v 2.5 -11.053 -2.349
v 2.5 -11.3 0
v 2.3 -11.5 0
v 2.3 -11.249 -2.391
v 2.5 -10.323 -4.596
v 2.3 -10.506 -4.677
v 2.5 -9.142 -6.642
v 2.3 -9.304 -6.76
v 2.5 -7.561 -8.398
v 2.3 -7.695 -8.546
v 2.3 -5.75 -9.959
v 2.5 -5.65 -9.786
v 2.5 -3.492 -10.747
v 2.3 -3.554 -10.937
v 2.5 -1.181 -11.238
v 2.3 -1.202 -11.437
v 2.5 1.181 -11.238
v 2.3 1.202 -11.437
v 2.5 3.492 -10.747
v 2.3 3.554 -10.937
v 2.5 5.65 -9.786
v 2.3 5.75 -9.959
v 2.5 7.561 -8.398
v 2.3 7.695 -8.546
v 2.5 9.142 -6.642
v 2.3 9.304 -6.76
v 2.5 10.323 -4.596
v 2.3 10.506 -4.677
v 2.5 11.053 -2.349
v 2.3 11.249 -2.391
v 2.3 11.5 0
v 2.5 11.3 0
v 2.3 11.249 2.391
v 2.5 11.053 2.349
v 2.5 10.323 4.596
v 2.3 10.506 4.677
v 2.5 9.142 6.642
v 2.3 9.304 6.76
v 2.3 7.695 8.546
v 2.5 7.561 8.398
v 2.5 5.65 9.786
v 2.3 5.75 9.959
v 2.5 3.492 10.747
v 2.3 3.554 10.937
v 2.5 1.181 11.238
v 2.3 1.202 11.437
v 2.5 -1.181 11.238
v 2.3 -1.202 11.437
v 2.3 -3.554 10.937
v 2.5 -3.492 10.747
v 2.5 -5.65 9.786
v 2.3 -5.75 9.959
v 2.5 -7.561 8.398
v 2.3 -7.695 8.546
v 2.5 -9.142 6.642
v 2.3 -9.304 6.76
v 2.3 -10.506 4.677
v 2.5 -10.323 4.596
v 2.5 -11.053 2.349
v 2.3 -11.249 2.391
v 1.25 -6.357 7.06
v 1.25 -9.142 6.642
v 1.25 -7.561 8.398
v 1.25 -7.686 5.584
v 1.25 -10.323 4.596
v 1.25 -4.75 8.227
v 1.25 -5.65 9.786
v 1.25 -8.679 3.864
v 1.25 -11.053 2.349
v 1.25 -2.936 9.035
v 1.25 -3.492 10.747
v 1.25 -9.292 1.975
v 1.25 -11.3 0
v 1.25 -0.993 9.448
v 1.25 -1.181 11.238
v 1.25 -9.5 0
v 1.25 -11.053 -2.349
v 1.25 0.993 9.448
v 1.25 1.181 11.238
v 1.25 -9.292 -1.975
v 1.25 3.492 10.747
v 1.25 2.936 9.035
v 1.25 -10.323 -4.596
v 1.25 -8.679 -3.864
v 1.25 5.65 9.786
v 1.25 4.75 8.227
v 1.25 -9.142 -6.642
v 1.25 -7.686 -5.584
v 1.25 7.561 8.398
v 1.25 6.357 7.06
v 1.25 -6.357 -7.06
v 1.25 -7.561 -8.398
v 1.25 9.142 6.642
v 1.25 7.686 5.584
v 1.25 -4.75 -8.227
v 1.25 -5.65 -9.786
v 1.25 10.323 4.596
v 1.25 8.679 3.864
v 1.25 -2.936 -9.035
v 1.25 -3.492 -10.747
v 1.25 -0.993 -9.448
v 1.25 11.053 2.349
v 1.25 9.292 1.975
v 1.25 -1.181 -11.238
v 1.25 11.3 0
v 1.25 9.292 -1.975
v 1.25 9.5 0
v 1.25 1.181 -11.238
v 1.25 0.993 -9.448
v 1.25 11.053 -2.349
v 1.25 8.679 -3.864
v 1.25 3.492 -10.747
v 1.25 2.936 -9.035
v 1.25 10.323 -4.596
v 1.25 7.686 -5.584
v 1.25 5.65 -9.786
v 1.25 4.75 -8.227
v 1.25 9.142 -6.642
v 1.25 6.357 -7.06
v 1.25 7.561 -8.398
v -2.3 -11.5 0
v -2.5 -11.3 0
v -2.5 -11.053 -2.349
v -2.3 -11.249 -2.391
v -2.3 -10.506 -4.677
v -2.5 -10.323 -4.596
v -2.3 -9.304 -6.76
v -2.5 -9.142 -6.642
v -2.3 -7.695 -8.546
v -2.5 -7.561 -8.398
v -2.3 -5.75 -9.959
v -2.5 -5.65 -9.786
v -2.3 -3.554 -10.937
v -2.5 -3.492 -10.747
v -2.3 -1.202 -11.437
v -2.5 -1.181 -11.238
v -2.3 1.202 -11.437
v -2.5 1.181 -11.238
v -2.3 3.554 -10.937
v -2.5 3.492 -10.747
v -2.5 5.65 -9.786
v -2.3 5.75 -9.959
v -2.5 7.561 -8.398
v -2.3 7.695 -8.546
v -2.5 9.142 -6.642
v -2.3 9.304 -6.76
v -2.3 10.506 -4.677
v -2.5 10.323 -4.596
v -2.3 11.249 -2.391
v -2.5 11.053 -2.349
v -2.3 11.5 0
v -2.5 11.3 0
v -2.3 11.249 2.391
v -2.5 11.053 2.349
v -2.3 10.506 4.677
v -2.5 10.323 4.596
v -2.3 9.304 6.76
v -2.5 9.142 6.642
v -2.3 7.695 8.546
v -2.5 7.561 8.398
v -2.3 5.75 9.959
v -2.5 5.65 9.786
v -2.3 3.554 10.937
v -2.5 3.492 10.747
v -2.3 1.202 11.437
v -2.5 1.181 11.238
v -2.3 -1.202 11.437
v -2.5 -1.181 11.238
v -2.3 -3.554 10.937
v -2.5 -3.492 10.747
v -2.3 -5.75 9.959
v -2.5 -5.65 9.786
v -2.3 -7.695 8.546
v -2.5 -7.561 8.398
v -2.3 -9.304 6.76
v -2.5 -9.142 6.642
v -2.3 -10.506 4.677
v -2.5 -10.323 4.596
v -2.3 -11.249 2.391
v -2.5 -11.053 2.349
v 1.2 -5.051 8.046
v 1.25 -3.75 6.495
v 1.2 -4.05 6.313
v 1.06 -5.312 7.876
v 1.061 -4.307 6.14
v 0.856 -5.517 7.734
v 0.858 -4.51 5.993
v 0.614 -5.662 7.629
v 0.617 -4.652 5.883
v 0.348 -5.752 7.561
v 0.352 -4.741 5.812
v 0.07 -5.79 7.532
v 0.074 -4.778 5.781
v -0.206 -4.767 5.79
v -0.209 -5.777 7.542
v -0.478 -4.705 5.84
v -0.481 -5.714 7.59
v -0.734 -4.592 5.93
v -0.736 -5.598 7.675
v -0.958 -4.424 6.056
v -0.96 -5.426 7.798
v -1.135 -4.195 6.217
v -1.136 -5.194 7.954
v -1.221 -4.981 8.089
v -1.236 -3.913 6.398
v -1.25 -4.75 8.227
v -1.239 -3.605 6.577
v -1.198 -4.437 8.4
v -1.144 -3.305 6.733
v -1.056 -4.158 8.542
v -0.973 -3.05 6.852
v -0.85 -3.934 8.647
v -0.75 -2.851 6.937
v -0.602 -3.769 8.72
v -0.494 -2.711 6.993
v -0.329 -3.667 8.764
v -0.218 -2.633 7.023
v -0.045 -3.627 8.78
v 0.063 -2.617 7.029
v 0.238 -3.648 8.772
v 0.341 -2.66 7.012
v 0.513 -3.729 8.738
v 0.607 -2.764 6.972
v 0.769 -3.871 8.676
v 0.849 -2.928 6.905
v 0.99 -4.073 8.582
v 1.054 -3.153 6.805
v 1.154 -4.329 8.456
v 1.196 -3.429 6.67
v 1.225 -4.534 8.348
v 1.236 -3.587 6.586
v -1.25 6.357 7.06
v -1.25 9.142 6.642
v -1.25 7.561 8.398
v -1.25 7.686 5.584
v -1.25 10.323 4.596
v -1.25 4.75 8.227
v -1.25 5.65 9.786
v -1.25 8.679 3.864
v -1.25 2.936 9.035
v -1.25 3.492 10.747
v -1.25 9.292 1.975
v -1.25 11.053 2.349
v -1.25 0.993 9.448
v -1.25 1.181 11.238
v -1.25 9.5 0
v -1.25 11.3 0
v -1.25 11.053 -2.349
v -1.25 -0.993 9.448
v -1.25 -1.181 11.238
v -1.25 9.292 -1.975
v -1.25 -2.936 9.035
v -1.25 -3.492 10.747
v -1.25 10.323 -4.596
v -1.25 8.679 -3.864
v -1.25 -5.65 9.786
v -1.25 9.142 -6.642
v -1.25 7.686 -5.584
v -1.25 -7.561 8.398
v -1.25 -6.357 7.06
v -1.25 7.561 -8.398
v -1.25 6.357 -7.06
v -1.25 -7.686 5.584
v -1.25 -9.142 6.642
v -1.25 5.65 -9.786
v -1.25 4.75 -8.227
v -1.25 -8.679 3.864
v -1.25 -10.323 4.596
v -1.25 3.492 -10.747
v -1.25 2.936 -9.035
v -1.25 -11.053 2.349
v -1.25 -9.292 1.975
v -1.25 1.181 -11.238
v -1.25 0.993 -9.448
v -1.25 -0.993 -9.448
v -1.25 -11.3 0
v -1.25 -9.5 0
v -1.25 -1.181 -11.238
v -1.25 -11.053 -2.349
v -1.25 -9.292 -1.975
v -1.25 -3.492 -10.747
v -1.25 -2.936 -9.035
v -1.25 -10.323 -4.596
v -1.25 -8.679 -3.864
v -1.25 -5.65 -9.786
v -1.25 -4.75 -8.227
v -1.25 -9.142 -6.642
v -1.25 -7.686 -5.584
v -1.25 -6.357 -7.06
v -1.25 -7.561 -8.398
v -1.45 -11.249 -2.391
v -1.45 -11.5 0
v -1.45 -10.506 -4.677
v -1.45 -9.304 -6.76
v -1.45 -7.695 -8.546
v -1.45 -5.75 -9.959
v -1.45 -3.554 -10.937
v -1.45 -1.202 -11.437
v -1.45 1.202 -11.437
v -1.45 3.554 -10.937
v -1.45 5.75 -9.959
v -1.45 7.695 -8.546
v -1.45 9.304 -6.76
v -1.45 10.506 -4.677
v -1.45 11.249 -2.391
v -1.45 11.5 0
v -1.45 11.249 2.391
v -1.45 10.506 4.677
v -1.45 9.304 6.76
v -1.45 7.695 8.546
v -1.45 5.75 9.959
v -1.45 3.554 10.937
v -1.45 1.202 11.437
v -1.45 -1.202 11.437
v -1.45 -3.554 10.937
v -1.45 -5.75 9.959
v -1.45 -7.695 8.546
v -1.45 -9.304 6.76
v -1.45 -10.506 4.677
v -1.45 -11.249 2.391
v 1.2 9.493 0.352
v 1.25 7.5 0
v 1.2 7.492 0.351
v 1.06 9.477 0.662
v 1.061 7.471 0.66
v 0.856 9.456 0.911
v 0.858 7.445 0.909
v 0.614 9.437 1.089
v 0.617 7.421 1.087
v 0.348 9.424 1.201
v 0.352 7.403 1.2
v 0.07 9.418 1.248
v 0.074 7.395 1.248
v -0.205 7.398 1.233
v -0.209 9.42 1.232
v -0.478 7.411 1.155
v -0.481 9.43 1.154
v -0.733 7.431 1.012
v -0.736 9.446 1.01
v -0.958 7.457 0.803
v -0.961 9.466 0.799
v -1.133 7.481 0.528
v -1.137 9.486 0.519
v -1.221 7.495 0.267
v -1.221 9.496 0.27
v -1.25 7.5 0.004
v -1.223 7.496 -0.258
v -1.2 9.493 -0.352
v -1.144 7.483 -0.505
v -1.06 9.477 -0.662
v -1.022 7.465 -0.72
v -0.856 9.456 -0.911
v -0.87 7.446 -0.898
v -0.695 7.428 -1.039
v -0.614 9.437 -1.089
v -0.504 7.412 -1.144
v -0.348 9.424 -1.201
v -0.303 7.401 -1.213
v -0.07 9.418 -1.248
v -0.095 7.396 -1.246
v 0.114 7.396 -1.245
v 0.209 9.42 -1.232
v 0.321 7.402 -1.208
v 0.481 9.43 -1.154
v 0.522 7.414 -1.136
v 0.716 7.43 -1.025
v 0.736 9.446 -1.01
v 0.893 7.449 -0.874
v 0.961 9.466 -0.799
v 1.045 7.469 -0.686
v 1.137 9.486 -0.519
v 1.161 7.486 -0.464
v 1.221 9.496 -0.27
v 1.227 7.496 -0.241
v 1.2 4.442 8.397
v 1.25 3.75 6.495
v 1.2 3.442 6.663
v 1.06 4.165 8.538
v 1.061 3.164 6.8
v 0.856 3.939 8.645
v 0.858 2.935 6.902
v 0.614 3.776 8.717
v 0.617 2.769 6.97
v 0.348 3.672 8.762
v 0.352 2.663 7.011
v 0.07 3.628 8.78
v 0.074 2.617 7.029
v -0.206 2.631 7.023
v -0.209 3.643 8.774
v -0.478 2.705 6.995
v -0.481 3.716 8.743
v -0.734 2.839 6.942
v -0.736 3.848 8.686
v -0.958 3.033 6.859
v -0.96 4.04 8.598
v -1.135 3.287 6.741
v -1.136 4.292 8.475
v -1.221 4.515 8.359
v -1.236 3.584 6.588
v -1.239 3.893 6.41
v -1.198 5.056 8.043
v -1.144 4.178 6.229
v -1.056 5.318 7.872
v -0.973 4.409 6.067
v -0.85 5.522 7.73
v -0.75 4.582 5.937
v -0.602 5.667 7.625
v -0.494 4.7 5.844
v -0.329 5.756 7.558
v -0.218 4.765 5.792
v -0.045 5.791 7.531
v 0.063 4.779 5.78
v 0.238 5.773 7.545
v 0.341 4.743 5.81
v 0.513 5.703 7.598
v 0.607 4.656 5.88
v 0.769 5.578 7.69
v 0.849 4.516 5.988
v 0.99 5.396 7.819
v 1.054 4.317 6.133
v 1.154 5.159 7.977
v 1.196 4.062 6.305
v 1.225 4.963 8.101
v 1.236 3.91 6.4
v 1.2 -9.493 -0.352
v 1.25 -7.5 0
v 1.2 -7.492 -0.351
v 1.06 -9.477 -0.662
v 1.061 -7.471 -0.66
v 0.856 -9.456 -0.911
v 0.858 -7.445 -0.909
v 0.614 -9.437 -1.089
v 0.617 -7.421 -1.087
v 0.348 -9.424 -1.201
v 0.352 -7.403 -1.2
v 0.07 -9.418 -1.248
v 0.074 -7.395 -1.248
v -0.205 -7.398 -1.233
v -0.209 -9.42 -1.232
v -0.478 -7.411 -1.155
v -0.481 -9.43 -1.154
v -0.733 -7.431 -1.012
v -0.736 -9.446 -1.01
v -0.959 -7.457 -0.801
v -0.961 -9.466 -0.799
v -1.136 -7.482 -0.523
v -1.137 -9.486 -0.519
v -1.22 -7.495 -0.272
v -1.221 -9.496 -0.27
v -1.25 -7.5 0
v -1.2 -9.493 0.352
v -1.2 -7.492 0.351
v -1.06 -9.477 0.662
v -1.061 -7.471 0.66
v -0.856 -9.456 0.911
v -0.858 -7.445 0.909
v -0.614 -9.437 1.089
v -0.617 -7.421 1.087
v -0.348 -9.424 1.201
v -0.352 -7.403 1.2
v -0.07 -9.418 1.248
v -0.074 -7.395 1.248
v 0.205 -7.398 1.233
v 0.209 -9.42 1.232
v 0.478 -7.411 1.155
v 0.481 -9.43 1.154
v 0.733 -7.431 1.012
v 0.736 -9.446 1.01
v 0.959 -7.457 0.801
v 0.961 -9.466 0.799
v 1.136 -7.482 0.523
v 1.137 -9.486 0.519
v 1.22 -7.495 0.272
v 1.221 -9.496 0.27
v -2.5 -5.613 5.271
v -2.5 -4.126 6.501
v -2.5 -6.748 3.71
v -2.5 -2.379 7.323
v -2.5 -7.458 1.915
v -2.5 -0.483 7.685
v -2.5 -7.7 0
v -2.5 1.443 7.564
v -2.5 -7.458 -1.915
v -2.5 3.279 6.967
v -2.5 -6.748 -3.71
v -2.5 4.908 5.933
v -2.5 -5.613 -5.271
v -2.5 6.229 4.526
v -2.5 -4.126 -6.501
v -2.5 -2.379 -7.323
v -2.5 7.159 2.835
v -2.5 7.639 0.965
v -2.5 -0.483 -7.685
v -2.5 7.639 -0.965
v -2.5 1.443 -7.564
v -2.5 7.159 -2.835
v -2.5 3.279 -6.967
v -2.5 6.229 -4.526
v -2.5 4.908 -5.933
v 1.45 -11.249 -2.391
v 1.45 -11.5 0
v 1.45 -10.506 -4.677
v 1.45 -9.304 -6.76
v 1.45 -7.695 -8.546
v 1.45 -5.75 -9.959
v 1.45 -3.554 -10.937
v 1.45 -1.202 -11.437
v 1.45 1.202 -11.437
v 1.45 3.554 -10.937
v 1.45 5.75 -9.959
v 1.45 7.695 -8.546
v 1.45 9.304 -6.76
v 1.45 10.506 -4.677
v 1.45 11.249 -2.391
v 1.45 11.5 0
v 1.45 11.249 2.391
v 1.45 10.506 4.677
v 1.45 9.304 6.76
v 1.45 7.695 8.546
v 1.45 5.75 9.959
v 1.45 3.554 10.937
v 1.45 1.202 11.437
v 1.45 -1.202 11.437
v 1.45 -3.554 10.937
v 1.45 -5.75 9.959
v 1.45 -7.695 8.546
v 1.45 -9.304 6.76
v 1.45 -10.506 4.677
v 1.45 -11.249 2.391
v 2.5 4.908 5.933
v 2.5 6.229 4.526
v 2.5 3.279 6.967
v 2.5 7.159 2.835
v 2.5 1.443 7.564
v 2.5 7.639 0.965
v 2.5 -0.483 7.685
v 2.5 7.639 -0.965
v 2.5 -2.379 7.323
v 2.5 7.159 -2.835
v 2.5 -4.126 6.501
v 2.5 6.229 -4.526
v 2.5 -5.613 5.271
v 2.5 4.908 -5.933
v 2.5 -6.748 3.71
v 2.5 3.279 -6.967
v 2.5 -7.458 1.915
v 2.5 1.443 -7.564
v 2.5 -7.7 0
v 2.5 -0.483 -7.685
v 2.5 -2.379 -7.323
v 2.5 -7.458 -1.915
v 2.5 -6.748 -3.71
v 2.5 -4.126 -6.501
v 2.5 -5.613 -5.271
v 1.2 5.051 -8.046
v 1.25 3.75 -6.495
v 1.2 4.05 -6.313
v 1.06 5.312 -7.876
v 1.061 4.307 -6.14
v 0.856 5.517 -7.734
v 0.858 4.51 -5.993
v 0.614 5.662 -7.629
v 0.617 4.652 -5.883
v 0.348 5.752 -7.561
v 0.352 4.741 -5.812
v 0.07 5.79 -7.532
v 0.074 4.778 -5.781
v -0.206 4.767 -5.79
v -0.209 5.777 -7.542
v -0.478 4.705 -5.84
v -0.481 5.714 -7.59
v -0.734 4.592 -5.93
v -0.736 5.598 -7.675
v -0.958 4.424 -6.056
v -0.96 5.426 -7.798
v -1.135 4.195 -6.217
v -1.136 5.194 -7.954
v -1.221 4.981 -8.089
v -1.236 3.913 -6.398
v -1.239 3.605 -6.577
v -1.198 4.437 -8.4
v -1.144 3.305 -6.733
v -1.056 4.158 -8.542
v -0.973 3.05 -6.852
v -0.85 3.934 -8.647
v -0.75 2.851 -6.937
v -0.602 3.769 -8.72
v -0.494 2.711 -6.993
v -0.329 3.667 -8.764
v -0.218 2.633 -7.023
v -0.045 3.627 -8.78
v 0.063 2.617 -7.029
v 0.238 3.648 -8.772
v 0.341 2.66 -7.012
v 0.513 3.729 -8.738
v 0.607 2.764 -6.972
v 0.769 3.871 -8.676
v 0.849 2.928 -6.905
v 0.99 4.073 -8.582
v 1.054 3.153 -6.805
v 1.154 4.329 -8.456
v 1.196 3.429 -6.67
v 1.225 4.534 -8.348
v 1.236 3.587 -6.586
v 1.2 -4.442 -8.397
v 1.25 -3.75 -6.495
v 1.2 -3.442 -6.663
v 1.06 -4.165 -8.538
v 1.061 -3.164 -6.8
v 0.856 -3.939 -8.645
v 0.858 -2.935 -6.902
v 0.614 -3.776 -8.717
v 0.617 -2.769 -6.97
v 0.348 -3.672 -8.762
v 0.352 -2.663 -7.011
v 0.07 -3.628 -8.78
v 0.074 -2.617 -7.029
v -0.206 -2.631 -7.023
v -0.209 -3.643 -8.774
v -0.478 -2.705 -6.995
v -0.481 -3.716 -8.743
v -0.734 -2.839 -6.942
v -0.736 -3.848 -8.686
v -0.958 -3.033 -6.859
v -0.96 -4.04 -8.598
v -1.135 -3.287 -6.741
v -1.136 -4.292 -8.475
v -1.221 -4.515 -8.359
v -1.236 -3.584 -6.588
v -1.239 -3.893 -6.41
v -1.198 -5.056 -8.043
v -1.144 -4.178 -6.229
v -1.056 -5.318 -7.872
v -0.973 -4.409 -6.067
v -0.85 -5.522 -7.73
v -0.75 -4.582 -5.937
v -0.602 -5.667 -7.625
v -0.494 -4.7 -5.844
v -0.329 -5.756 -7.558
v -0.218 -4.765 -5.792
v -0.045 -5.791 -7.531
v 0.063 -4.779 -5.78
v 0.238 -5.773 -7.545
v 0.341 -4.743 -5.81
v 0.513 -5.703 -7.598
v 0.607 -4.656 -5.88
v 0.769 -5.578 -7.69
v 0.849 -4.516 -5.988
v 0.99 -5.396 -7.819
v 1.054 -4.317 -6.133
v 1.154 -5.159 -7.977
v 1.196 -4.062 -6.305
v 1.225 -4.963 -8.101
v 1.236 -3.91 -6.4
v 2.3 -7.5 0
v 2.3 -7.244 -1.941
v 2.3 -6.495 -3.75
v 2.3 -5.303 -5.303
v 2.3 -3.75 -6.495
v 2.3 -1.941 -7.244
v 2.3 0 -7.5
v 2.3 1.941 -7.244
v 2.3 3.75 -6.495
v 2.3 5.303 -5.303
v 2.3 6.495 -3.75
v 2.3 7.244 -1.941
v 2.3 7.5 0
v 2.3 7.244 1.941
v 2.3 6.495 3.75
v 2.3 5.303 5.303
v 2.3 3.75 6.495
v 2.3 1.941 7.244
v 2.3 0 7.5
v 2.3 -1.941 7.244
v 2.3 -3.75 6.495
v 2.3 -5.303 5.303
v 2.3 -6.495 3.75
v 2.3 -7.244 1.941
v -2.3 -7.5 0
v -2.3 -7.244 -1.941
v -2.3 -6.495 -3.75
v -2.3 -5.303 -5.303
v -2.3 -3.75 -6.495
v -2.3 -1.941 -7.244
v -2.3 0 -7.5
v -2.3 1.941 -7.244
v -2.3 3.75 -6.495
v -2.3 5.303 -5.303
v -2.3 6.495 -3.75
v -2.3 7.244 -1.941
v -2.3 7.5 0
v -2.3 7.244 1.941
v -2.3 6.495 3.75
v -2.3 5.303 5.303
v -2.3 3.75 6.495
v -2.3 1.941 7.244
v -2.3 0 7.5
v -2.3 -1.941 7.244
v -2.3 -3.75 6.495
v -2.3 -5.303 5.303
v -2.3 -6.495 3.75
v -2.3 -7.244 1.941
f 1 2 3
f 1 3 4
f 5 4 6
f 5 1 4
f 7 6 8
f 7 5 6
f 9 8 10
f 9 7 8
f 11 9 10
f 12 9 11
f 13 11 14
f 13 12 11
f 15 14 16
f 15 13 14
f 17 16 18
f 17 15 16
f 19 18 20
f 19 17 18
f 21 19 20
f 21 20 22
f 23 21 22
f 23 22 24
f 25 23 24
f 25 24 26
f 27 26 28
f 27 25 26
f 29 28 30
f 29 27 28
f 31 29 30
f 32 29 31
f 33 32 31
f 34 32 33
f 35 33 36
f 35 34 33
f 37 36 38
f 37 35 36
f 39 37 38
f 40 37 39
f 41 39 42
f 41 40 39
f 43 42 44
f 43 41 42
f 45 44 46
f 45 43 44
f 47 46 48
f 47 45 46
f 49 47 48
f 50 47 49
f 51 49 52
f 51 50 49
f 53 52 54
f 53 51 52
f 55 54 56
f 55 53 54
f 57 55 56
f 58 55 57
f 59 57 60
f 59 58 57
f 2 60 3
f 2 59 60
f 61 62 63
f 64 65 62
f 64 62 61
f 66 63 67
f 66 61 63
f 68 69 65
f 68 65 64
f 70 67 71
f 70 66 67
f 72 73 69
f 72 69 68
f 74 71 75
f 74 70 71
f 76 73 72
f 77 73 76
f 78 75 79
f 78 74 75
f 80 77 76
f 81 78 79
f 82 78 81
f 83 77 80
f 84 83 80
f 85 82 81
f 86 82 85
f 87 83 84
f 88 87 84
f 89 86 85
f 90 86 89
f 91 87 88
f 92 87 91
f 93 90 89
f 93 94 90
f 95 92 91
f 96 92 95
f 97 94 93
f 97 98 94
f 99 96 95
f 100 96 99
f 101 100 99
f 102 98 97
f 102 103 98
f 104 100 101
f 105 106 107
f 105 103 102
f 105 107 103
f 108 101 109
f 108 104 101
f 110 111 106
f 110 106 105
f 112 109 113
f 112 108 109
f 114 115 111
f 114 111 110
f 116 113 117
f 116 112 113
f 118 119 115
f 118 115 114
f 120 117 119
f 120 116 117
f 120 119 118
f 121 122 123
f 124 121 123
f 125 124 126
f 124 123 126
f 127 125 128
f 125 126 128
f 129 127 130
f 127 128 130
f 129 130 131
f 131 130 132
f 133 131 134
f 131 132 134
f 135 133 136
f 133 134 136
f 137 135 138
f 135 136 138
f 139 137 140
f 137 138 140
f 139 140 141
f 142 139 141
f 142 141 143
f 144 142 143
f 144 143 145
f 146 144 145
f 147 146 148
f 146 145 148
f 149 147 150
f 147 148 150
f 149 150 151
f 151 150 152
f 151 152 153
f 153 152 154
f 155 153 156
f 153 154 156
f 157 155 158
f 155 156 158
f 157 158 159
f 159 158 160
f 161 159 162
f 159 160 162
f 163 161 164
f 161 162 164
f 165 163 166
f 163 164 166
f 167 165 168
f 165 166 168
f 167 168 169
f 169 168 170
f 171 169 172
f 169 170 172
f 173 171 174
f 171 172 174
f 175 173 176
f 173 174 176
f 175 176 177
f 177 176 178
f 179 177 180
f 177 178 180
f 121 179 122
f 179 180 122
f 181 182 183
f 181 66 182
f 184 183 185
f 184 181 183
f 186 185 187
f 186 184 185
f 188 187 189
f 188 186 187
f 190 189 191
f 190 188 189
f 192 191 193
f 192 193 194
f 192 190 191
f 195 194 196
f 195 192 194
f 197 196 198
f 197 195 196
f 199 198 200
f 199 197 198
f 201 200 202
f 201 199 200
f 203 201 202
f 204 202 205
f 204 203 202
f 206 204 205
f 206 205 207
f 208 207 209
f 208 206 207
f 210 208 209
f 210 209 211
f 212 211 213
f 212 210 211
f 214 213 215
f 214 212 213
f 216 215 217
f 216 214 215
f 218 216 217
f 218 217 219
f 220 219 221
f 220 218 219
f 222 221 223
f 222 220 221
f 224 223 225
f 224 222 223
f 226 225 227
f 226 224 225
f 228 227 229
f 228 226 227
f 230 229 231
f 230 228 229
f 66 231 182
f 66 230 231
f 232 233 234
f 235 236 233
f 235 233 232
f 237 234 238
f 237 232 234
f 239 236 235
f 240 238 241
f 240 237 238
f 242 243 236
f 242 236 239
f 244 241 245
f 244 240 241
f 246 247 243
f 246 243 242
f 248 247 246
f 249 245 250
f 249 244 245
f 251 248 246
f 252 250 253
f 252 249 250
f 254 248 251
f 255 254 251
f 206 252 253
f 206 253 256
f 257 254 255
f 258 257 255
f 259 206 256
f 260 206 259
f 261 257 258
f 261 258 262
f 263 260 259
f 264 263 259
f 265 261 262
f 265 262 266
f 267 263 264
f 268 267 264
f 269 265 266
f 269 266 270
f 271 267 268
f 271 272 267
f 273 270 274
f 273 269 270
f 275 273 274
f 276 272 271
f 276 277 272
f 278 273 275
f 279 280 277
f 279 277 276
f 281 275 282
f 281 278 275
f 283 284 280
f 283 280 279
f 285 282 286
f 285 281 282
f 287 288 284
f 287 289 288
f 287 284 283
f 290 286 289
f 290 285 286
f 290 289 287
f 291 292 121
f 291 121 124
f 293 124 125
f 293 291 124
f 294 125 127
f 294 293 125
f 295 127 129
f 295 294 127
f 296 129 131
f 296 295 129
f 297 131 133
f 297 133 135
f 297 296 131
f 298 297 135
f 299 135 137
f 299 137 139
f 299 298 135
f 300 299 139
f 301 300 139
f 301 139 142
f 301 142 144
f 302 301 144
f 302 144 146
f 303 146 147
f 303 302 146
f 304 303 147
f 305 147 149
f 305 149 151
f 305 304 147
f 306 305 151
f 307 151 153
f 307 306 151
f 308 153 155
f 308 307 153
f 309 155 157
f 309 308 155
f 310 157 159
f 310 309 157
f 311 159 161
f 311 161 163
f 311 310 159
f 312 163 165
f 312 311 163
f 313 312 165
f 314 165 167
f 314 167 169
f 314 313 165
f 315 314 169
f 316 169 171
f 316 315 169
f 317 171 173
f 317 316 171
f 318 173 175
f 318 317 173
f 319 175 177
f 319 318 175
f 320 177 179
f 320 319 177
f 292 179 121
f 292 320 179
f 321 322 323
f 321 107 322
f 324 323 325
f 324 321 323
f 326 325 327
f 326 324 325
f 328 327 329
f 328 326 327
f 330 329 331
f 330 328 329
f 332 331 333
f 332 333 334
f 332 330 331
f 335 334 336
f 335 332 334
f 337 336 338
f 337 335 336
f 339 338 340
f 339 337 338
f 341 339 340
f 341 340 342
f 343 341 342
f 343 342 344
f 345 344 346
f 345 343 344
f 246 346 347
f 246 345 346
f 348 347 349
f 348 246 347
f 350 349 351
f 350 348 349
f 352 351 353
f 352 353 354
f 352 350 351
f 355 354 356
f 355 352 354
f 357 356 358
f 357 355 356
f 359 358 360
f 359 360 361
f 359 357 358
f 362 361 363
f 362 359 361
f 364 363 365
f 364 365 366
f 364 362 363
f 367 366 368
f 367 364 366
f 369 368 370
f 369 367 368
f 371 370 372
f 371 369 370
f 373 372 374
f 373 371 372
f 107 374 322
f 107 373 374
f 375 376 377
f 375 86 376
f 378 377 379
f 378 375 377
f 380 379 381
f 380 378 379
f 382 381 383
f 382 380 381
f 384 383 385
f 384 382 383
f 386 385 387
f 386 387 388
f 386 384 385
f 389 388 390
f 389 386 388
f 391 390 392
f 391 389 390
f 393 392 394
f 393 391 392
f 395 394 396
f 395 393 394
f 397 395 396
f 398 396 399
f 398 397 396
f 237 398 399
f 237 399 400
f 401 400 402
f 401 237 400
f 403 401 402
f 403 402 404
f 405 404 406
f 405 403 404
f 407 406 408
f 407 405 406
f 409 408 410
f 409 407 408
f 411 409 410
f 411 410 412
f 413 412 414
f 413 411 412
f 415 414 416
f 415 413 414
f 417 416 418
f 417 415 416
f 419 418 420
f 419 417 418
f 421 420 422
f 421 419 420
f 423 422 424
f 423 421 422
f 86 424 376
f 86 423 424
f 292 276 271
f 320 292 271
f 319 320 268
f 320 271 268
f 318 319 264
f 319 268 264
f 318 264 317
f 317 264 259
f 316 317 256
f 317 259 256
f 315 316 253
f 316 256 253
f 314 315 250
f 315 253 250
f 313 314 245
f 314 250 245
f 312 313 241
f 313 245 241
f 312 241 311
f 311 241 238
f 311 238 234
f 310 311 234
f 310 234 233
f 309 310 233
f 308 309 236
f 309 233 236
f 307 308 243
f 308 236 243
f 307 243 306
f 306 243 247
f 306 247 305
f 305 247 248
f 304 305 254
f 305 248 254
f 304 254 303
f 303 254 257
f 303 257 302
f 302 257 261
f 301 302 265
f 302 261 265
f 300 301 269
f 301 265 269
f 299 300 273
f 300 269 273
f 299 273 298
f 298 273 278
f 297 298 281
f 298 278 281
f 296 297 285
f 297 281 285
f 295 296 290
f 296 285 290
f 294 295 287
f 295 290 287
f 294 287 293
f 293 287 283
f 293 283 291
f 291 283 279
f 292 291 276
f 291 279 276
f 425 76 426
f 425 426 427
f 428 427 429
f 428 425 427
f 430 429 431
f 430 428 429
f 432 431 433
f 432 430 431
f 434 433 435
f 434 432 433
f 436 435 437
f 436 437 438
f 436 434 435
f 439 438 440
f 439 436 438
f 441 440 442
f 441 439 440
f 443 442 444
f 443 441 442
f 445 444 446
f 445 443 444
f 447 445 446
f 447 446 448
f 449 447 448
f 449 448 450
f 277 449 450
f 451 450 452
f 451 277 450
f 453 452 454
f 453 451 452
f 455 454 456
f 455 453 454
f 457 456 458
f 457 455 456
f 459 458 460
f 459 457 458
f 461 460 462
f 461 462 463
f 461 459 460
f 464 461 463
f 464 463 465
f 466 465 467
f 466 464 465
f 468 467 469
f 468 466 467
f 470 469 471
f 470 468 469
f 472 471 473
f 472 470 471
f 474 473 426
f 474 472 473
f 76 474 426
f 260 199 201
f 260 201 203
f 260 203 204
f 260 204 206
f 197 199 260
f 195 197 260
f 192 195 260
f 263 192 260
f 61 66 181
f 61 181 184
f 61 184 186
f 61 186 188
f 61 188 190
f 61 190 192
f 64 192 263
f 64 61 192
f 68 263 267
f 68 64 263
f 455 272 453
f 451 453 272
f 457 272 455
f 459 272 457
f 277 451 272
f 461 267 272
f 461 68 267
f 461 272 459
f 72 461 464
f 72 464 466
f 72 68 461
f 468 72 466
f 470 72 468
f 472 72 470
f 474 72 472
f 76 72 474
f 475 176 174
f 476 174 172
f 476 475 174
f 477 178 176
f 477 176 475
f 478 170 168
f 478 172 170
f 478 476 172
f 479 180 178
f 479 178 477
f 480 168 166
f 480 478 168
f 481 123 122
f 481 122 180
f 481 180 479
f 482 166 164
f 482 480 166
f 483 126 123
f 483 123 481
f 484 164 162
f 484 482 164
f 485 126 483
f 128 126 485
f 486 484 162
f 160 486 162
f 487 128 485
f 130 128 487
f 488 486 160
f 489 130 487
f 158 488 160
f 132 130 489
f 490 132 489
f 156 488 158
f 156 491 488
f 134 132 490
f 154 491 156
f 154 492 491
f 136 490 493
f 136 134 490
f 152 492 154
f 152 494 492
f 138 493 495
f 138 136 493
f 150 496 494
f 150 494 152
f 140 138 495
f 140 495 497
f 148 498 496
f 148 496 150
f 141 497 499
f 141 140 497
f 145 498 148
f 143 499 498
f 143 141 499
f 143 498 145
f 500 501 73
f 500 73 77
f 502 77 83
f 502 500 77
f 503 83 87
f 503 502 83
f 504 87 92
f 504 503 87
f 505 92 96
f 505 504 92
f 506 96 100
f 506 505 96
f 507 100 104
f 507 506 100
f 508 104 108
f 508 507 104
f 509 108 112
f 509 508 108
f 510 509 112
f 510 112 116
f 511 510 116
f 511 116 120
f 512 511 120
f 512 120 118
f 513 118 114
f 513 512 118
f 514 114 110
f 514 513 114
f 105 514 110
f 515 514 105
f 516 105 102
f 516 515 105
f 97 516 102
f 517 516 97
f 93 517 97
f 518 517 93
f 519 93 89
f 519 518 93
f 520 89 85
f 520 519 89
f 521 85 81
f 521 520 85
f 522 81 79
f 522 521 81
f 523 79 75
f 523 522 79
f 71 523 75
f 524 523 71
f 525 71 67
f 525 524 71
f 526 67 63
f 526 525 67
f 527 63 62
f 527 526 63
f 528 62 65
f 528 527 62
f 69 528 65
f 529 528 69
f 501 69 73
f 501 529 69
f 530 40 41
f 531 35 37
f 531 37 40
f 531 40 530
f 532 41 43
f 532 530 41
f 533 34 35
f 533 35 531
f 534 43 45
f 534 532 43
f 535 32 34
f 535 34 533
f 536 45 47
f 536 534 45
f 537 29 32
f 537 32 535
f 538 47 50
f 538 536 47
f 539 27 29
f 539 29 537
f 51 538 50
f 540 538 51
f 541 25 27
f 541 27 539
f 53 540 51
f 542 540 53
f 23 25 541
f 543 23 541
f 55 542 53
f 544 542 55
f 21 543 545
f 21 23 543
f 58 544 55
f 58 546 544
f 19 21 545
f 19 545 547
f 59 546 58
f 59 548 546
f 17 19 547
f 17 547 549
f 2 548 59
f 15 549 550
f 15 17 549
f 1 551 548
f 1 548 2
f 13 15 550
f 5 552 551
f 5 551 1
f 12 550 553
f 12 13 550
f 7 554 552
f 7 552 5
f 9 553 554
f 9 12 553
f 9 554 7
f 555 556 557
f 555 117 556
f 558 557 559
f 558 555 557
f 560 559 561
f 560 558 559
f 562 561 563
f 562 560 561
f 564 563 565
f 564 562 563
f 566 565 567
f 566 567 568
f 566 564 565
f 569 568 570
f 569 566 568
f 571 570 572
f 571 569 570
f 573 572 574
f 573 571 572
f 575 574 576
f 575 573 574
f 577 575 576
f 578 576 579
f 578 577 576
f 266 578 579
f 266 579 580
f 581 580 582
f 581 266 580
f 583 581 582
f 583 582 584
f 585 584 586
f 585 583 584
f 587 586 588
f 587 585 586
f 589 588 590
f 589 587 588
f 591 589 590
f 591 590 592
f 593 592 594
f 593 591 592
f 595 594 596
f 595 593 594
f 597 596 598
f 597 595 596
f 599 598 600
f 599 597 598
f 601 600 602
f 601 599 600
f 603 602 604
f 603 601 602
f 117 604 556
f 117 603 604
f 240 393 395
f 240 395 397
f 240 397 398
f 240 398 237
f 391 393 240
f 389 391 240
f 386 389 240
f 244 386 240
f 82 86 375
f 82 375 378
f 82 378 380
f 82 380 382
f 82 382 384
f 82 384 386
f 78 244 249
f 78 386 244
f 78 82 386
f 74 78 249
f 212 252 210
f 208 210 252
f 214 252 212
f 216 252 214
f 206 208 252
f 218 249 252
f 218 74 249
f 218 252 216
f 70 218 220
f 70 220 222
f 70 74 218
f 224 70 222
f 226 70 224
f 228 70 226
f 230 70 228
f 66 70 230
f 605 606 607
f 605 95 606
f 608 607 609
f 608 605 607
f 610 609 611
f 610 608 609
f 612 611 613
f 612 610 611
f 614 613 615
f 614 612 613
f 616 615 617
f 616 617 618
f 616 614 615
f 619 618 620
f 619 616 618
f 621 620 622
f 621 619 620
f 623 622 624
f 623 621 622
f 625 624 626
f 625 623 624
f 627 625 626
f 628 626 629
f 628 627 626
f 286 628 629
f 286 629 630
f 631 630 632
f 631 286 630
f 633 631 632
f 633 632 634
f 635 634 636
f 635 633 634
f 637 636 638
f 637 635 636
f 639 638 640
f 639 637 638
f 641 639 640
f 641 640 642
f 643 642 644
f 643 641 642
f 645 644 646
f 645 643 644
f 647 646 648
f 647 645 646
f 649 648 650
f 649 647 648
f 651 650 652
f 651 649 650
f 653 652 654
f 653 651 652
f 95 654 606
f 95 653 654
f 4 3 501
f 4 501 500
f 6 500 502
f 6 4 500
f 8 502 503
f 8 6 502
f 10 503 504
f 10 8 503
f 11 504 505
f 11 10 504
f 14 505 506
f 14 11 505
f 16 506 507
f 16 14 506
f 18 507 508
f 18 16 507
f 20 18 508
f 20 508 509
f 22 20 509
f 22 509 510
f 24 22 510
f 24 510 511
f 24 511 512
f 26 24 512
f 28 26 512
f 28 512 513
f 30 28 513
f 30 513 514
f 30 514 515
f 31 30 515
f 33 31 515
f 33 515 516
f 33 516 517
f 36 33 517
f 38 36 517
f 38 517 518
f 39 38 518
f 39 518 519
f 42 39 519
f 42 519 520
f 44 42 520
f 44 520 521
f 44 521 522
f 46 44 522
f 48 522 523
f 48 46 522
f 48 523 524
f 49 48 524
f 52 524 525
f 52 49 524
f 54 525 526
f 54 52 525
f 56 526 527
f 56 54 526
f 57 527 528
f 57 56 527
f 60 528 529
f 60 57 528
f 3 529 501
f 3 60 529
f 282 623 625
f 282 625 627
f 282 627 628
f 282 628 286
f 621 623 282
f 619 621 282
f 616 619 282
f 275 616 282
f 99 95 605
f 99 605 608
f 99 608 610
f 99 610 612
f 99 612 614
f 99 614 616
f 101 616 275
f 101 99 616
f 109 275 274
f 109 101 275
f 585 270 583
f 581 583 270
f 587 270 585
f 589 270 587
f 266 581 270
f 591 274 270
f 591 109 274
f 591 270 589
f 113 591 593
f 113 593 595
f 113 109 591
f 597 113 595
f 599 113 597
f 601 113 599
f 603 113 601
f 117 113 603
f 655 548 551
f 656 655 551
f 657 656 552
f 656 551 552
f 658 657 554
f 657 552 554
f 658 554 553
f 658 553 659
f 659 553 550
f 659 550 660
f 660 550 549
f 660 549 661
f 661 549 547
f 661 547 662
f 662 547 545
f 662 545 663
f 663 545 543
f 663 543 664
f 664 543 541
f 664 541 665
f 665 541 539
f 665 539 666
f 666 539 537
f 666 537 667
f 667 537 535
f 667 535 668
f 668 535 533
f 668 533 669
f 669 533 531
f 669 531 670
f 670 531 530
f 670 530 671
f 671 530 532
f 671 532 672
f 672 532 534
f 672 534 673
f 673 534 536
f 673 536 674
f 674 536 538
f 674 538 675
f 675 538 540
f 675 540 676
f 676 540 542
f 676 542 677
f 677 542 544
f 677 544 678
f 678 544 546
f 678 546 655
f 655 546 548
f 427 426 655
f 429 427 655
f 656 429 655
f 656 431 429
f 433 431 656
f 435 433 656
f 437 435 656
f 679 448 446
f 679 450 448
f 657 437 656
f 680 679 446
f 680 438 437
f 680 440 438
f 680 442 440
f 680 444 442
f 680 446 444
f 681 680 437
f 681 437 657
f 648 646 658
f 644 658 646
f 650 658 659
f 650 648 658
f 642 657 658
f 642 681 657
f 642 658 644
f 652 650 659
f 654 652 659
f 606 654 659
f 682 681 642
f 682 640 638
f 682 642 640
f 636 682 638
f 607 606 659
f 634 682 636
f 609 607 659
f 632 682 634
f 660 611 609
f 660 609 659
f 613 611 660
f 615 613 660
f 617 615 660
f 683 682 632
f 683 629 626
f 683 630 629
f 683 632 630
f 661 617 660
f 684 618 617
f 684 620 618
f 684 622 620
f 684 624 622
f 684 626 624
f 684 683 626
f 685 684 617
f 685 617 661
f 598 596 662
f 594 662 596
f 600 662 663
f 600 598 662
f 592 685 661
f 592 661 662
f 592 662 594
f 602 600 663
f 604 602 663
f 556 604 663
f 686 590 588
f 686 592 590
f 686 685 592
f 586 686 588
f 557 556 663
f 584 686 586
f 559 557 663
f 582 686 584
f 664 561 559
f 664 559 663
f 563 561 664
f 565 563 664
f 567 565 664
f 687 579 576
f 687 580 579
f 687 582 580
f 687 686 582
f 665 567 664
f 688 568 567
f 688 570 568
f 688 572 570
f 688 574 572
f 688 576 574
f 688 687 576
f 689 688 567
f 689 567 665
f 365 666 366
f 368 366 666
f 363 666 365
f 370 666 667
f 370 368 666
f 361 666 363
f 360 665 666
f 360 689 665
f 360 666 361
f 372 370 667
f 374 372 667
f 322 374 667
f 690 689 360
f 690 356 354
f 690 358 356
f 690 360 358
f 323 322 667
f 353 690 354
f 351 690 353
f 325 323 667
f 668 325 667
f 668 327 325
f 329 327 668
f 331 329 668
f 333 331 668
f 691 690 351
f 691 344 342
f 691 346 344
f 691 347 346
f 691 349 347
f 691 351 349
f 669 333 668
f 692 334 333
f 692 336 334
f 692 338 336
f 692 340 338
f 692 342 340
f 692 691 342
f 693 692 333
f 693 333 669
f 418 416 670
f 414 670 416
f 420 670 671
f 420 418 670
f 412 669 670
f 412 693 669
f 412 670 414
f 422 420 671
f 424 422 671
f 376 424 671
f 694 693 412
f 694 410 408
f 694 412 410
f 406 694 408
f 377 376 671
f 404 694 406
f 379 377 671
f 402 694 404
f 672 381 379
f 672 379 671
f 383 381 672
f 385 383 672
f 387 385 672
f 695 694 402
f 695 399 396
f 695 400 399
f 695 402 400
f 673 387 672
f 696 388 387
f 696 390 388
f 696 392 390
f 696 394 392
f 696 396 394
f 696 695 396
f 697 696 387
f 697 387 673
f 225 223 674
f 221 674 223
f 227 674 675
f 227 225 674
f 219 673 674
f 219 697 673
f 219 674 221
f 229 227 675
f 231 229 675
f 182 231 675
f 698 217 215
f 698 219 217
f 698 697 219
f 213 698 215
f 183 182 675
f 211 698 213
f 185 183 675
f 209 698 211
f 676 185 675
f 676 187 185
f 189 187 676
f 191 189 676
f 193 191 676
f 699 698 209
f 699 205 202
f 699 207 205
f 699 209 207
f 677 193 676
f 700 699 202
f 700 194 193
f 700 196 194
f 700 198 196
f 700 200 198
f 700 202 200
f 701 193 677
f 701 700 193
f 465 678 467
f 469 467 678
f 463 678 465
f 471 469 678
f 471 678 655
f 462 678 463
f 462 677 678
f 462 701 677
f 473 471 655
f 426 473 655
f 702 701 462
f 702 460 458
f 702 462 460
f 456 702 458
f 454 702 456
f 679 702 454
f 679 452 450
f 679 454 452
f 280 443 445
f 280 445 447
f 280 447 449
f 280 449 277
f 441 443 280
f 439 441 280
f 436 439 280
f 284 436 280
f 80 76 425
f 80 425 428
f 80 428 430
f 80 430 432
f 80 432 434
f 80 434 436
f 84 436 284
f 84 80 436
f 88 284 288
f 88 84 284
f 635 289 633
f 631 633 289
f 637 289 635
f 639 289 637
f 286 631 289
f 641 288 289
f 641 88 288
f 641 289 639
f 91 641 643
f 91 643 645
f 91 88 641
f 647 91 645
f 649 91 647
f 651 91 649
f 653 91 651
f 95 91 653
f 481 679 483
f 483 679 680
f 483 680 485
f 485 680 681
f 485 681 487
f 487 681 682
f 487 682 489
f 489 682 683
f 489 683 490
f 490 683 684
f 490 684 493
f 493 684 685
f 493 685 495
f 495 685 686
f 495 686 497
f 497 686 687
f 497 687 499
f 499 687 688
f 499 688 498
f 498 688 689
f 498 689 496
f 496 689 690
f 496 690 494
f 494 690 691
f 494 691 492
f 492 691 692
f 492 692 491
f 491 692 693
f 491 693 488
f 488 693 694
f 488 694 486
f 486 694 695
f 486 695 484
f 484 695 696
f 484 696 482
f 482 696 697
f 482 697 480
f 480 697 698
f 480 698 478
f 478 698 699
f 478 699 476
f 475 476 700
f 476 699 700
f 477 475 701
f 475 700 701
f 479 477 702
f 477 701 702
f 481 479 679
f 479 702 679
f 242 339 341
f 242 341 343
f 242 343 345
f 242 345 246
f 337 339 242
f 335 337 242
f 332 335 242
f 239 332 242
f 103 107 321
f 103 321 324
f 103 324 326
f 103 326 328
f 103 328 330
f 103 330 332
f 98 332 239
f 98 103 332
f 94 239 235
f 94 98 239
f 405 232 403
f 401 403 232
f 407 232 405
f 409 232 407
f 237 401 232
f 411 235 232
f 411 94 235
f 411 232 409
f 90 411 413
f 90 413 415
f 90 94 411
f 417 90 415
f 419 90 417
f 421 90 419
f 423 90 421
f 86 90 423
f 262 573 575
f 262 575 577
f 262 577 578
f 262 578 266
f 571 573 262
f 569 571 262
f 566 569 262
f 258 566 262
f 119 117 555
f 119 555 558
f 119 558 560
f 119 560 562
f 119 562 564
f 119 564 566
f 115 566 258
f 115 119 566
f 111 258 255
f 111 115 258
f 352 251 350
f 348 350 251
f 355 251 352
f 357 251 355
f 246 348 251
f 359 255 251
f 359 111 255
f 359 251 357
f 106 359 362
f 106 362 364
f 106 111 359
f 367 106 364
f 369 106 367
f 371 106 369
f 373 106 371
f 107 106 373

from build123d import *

# Parameters (mm, degrees)
F0_W     = 1.25
F0_H     = 9
F3_COUNT = 6
F5_SIZE  = 0.2
F6_SIZE  = 0.2


with BuildPart() as f1:
    # F0 (on Top) → F1 (revolve)
    with BuildSketch(Plane.XY):
        Polygon((2.5, -7.5), (0, -7.5), (-2.5, -7.5), (-2.5, -11.5), (-1.25, -11.5), (-1.25, -9.5), (0, -9.5), (1.25, -9.5), (1.25, -11.5), (2.5, -11.5), align=None)
    revolve(axis=Axis((6.057695, 0, 0), (1, 0, 0)))


with BuildPart() as f2:
    # F0 (on Top) → F2 (revolve)
    with BuildSketch(Plane.XY):
        with Locations((0.625, 8.5)):
            Rectangle(F0_W, F0_H)
    revolve(axis=Axis((0, 8.5, 0), (0, -1, 0)))


with BuildPart() as f3_1:
    # F3: instance of F2
    add(f2.part.rotate(Axis((6.057695, 0, 0), (1, 0, 0)), 1 * 360 / F3_COUNT))


with BuildPart() as f3_2:
    # F3: instance of F2
    add(f2.part.rotate(Axis((6.057695, 0, 0), (1, 0, 0)), 2 * 360 / F3_COUNT))


with BuildPart() as f3_3:
    # F3: instance of F2
    add(f2.part.rotate(Axis((6.057695, 0, 0), (1, 0, 0)), 3 * 360 / F3_COUNT))


with BuildPart() as f3_4:
    # F3: instance of F2
    add(f2.part.rotate(Axis((6.057695, 0, 0), (1, 0, 0)), 4 * 360 / F3_COUNT))


with BuildPart() as f3_5:
    # F3: instance of F2
    add(f2.part.rotate(Axis((6.057695, 0, 0), (1, 0, 0)), 5 * 360 / F3_COUNT))


with BuildPart() as f1_1:
    add(f1.part)

    # F4: cut F2, F3_2, F3_1, F3_3, F3_4, F3_5
    add(f2.part, mode=Mode.SUBTRACT)
    add(f3_2.part, mode=Mode.SUBTRACT)
    add(f3_1.part, mode=Mode.SUBTRACT)
    add(f3_3.part, mode=Mode.SUBTRACT)
    add(f3_4.part, mode=Mode.SUBTRACT)
    add(f3_5.part, mode=Mode.SUBTRACT)

    # F5
    f5_edges = [f1_1.edges().sort_by_distance(p)[0] for p in [
        (2.5, 11.5, 0),
        (-2.5, 11.5, 0),
    ]]
    chamfer(f5_edges, length=F5_SIZE)

    # F6
    f6_edges = [f1_1.edges().sort_by_distance(p)[0] for p in [
        (-1.25, 11.5, 0),
        (1.25, 11.5, 0),
        (2.5, 7.5, 0),
        (-2.5, 7.5, 0),
    ]]
    chamfer(f6_edges, length=F6_SIZE)


solid = f1_1.part
